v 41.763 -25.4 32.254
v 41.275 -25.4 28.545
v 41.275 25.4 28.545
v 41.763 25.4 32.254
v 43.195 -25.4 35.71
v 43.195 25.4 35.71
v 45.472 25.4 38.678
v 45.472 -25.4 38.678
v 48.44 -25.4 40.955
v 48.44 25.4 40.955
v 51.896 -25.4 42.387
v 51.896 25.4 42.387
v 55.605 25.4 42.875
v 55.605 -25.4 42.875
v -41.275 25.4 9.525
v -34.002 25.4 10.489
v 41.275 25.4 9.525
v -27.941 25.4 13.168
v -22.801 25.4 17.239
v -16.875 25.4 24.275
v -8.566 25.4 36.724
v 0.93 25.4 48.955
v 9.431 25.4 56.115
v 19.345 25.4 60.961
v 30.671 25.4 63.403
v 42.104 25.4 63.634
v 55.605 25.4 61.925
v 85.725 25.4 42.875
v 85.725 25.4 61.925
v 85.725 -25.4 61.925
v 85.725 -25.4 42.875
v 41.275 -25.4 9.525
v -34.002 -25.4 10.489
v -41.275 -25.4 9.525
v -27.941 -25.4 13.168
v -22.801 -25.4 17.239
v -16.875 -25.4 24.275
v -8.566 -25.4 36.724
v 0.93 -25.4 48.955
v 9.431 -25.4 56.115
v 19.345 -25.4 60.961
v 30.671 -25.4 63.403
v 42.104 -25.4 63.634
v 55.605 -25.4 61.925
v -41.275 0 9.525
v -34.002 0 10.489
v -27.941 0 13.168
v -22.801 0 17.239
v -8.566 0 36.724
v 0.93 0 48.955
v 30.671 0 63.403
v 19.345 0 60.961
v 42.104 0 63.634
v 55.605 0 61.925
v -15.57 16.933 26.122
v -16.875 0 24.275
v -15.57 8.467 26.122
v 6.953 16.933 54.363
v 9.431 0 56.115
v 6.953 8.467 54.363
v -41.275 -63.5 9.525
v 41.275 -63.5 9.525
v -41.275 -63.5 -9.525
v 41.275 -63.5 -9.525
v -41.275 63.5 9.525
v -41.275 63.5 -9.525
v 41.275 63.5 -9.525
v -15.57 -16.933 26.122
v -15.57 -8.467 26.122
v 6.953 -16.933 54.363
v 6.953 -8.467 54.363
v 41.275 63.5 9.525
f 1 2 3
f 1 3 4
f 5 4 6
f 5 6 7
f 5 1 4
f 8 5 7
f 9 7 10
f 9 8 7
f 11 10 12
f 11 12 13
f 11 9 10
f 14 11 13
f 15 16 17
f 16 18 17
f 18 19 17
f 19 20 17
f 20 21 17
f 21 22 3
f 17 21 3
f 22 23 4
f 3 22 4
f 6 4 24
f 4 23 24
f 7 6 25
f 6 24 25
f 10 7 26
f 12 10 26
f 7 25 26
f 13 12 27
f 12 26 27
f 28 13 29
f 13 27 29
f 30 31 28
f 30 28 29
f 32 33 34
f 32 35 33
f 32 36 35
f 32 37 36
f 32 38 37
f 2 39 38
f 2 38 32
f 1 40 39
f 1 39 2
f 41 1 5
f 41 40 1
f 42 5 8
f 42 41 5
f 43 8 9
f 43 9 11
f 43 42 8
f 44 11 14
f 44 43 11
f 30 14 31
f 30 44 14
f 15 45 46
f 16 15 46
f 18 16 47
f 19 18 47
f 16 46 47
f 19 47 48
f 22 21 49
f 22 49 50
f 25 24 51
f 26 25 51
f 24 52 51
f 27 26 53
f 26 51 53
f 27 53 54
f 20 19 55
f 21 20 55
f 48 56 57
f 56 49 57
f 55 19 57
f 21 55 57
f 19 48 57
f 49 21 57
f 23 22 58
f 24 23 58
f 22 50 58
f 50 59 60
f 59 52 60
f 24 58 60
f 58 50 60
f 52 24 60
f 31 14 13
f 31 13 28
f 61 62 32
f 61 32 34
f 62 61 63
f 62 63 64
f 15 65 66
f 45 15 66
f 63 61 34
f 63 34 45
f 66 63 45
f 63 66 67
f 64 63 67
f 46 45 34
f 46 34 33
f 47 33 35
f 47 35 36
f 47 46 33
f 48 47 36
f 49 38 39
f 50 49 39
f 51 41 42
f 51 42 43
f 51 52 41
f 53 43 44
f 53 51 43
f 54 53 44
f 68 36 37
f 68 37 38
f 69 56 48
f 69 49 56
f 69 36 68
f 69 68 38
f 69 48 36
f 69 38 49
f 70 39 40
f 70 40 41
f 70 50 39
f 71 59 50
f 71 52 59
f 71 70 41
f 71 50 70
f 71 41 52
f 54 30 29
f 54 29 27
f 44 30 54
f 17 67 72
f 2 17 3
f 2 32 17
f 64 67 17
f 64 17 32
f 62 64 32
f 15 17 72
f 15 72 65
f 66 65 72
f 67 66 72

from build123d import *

# Parameters (mm, degrees)
F1_DEPTH = 63.5
F0_W     = 25.196091
F0_H     = 19.05
F2_DEPTH = 25.4


with BuildPart() as f1:
    # F0 (on Front) → F1 (new body, symmetric)
    with BuildSketch(Plane.XZ):
        Polygon((22.225, 9.525), (-41.275, 9.525), (-41.275, -9.525), (41.275, -9.525), (41.275, 9.525), align=None)
    extrude(amount=F1_DEPTH, both=True)

    # F0 (on Front) → F2 (join, symmetric)
    with BuildSketch(Plane.XZ):
        with BuildLine():
            Line((22.225, 28.545261), (22.225, 9.525))
            Line((22.225, 9.525), (41.275, 9.525))
            Line((41.275, 9.525), (41.275, 28.545261))
            ThreePointArc((41.275, 28.545261), (45.472142, 38.678058), (55.604939, 42.8752))
            Line((55.604939, 42.8752), (60.528909, 42.8752))
            Line((60.528909, 42.8752), (60.528909, 61.9252))
            Line((60.528909, 61.9252), (55.604939, 61.9252))
            ThreePointArc((55.604939, 61.9252), (32.001758, 52.148442), (22.225, 28.545261))
        make_face()
        with Locations((73.126954, 52.4002)):
            Rectangle(F0_W, F0_H)
        with BuildLine():
            add(Edge.make_bspline(
                [(-41.275, 9.525), (-4.208209, 9.525), (-15.882595, 75.476266), (55.604939, 61.9252)],
                knots=[0, 0, 0, 0, 110.143105, 110.143105, 110.143105, 110.143105], degree=3))
            Line((-41.275, 9.525), (22.225, 9.525))
            Line((22.225, 9.525), (22.225, 28.545261))
            ThreePointArc((22.225, 28.545261), (32.001758, 52.148442), (55.604939, 61.9252))
        make_face()
    extrude(amount=F2_DEPTH, both=True)


solid = f1.part
